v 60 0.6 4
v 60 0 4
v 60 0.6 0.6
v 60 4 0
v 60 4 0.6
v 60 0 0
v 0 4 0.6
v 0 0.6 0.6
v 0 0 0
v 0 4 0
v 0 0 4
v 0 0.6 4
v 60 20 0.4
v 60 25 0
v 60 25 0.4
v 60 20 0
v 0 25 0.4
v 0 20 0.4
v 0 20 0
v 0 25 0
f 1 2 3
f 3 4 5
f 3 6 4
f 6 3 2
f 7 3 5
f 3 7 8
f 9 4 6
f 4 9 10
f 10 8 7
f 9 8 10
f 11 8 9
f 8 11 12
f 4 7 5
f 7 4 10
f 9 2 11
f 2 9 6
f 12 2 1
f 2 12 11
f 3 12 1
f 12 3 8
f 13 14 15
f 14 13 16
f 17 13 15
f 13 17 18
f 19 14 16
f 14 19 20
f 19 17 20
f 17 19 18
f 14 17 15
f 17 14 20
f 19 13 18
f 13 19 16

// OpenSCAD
cube([60, 4, 0.6]);
cube([60, 0.6, 4]);

translate([0, 20, 0]) cube([60, 5, 0.4]);
